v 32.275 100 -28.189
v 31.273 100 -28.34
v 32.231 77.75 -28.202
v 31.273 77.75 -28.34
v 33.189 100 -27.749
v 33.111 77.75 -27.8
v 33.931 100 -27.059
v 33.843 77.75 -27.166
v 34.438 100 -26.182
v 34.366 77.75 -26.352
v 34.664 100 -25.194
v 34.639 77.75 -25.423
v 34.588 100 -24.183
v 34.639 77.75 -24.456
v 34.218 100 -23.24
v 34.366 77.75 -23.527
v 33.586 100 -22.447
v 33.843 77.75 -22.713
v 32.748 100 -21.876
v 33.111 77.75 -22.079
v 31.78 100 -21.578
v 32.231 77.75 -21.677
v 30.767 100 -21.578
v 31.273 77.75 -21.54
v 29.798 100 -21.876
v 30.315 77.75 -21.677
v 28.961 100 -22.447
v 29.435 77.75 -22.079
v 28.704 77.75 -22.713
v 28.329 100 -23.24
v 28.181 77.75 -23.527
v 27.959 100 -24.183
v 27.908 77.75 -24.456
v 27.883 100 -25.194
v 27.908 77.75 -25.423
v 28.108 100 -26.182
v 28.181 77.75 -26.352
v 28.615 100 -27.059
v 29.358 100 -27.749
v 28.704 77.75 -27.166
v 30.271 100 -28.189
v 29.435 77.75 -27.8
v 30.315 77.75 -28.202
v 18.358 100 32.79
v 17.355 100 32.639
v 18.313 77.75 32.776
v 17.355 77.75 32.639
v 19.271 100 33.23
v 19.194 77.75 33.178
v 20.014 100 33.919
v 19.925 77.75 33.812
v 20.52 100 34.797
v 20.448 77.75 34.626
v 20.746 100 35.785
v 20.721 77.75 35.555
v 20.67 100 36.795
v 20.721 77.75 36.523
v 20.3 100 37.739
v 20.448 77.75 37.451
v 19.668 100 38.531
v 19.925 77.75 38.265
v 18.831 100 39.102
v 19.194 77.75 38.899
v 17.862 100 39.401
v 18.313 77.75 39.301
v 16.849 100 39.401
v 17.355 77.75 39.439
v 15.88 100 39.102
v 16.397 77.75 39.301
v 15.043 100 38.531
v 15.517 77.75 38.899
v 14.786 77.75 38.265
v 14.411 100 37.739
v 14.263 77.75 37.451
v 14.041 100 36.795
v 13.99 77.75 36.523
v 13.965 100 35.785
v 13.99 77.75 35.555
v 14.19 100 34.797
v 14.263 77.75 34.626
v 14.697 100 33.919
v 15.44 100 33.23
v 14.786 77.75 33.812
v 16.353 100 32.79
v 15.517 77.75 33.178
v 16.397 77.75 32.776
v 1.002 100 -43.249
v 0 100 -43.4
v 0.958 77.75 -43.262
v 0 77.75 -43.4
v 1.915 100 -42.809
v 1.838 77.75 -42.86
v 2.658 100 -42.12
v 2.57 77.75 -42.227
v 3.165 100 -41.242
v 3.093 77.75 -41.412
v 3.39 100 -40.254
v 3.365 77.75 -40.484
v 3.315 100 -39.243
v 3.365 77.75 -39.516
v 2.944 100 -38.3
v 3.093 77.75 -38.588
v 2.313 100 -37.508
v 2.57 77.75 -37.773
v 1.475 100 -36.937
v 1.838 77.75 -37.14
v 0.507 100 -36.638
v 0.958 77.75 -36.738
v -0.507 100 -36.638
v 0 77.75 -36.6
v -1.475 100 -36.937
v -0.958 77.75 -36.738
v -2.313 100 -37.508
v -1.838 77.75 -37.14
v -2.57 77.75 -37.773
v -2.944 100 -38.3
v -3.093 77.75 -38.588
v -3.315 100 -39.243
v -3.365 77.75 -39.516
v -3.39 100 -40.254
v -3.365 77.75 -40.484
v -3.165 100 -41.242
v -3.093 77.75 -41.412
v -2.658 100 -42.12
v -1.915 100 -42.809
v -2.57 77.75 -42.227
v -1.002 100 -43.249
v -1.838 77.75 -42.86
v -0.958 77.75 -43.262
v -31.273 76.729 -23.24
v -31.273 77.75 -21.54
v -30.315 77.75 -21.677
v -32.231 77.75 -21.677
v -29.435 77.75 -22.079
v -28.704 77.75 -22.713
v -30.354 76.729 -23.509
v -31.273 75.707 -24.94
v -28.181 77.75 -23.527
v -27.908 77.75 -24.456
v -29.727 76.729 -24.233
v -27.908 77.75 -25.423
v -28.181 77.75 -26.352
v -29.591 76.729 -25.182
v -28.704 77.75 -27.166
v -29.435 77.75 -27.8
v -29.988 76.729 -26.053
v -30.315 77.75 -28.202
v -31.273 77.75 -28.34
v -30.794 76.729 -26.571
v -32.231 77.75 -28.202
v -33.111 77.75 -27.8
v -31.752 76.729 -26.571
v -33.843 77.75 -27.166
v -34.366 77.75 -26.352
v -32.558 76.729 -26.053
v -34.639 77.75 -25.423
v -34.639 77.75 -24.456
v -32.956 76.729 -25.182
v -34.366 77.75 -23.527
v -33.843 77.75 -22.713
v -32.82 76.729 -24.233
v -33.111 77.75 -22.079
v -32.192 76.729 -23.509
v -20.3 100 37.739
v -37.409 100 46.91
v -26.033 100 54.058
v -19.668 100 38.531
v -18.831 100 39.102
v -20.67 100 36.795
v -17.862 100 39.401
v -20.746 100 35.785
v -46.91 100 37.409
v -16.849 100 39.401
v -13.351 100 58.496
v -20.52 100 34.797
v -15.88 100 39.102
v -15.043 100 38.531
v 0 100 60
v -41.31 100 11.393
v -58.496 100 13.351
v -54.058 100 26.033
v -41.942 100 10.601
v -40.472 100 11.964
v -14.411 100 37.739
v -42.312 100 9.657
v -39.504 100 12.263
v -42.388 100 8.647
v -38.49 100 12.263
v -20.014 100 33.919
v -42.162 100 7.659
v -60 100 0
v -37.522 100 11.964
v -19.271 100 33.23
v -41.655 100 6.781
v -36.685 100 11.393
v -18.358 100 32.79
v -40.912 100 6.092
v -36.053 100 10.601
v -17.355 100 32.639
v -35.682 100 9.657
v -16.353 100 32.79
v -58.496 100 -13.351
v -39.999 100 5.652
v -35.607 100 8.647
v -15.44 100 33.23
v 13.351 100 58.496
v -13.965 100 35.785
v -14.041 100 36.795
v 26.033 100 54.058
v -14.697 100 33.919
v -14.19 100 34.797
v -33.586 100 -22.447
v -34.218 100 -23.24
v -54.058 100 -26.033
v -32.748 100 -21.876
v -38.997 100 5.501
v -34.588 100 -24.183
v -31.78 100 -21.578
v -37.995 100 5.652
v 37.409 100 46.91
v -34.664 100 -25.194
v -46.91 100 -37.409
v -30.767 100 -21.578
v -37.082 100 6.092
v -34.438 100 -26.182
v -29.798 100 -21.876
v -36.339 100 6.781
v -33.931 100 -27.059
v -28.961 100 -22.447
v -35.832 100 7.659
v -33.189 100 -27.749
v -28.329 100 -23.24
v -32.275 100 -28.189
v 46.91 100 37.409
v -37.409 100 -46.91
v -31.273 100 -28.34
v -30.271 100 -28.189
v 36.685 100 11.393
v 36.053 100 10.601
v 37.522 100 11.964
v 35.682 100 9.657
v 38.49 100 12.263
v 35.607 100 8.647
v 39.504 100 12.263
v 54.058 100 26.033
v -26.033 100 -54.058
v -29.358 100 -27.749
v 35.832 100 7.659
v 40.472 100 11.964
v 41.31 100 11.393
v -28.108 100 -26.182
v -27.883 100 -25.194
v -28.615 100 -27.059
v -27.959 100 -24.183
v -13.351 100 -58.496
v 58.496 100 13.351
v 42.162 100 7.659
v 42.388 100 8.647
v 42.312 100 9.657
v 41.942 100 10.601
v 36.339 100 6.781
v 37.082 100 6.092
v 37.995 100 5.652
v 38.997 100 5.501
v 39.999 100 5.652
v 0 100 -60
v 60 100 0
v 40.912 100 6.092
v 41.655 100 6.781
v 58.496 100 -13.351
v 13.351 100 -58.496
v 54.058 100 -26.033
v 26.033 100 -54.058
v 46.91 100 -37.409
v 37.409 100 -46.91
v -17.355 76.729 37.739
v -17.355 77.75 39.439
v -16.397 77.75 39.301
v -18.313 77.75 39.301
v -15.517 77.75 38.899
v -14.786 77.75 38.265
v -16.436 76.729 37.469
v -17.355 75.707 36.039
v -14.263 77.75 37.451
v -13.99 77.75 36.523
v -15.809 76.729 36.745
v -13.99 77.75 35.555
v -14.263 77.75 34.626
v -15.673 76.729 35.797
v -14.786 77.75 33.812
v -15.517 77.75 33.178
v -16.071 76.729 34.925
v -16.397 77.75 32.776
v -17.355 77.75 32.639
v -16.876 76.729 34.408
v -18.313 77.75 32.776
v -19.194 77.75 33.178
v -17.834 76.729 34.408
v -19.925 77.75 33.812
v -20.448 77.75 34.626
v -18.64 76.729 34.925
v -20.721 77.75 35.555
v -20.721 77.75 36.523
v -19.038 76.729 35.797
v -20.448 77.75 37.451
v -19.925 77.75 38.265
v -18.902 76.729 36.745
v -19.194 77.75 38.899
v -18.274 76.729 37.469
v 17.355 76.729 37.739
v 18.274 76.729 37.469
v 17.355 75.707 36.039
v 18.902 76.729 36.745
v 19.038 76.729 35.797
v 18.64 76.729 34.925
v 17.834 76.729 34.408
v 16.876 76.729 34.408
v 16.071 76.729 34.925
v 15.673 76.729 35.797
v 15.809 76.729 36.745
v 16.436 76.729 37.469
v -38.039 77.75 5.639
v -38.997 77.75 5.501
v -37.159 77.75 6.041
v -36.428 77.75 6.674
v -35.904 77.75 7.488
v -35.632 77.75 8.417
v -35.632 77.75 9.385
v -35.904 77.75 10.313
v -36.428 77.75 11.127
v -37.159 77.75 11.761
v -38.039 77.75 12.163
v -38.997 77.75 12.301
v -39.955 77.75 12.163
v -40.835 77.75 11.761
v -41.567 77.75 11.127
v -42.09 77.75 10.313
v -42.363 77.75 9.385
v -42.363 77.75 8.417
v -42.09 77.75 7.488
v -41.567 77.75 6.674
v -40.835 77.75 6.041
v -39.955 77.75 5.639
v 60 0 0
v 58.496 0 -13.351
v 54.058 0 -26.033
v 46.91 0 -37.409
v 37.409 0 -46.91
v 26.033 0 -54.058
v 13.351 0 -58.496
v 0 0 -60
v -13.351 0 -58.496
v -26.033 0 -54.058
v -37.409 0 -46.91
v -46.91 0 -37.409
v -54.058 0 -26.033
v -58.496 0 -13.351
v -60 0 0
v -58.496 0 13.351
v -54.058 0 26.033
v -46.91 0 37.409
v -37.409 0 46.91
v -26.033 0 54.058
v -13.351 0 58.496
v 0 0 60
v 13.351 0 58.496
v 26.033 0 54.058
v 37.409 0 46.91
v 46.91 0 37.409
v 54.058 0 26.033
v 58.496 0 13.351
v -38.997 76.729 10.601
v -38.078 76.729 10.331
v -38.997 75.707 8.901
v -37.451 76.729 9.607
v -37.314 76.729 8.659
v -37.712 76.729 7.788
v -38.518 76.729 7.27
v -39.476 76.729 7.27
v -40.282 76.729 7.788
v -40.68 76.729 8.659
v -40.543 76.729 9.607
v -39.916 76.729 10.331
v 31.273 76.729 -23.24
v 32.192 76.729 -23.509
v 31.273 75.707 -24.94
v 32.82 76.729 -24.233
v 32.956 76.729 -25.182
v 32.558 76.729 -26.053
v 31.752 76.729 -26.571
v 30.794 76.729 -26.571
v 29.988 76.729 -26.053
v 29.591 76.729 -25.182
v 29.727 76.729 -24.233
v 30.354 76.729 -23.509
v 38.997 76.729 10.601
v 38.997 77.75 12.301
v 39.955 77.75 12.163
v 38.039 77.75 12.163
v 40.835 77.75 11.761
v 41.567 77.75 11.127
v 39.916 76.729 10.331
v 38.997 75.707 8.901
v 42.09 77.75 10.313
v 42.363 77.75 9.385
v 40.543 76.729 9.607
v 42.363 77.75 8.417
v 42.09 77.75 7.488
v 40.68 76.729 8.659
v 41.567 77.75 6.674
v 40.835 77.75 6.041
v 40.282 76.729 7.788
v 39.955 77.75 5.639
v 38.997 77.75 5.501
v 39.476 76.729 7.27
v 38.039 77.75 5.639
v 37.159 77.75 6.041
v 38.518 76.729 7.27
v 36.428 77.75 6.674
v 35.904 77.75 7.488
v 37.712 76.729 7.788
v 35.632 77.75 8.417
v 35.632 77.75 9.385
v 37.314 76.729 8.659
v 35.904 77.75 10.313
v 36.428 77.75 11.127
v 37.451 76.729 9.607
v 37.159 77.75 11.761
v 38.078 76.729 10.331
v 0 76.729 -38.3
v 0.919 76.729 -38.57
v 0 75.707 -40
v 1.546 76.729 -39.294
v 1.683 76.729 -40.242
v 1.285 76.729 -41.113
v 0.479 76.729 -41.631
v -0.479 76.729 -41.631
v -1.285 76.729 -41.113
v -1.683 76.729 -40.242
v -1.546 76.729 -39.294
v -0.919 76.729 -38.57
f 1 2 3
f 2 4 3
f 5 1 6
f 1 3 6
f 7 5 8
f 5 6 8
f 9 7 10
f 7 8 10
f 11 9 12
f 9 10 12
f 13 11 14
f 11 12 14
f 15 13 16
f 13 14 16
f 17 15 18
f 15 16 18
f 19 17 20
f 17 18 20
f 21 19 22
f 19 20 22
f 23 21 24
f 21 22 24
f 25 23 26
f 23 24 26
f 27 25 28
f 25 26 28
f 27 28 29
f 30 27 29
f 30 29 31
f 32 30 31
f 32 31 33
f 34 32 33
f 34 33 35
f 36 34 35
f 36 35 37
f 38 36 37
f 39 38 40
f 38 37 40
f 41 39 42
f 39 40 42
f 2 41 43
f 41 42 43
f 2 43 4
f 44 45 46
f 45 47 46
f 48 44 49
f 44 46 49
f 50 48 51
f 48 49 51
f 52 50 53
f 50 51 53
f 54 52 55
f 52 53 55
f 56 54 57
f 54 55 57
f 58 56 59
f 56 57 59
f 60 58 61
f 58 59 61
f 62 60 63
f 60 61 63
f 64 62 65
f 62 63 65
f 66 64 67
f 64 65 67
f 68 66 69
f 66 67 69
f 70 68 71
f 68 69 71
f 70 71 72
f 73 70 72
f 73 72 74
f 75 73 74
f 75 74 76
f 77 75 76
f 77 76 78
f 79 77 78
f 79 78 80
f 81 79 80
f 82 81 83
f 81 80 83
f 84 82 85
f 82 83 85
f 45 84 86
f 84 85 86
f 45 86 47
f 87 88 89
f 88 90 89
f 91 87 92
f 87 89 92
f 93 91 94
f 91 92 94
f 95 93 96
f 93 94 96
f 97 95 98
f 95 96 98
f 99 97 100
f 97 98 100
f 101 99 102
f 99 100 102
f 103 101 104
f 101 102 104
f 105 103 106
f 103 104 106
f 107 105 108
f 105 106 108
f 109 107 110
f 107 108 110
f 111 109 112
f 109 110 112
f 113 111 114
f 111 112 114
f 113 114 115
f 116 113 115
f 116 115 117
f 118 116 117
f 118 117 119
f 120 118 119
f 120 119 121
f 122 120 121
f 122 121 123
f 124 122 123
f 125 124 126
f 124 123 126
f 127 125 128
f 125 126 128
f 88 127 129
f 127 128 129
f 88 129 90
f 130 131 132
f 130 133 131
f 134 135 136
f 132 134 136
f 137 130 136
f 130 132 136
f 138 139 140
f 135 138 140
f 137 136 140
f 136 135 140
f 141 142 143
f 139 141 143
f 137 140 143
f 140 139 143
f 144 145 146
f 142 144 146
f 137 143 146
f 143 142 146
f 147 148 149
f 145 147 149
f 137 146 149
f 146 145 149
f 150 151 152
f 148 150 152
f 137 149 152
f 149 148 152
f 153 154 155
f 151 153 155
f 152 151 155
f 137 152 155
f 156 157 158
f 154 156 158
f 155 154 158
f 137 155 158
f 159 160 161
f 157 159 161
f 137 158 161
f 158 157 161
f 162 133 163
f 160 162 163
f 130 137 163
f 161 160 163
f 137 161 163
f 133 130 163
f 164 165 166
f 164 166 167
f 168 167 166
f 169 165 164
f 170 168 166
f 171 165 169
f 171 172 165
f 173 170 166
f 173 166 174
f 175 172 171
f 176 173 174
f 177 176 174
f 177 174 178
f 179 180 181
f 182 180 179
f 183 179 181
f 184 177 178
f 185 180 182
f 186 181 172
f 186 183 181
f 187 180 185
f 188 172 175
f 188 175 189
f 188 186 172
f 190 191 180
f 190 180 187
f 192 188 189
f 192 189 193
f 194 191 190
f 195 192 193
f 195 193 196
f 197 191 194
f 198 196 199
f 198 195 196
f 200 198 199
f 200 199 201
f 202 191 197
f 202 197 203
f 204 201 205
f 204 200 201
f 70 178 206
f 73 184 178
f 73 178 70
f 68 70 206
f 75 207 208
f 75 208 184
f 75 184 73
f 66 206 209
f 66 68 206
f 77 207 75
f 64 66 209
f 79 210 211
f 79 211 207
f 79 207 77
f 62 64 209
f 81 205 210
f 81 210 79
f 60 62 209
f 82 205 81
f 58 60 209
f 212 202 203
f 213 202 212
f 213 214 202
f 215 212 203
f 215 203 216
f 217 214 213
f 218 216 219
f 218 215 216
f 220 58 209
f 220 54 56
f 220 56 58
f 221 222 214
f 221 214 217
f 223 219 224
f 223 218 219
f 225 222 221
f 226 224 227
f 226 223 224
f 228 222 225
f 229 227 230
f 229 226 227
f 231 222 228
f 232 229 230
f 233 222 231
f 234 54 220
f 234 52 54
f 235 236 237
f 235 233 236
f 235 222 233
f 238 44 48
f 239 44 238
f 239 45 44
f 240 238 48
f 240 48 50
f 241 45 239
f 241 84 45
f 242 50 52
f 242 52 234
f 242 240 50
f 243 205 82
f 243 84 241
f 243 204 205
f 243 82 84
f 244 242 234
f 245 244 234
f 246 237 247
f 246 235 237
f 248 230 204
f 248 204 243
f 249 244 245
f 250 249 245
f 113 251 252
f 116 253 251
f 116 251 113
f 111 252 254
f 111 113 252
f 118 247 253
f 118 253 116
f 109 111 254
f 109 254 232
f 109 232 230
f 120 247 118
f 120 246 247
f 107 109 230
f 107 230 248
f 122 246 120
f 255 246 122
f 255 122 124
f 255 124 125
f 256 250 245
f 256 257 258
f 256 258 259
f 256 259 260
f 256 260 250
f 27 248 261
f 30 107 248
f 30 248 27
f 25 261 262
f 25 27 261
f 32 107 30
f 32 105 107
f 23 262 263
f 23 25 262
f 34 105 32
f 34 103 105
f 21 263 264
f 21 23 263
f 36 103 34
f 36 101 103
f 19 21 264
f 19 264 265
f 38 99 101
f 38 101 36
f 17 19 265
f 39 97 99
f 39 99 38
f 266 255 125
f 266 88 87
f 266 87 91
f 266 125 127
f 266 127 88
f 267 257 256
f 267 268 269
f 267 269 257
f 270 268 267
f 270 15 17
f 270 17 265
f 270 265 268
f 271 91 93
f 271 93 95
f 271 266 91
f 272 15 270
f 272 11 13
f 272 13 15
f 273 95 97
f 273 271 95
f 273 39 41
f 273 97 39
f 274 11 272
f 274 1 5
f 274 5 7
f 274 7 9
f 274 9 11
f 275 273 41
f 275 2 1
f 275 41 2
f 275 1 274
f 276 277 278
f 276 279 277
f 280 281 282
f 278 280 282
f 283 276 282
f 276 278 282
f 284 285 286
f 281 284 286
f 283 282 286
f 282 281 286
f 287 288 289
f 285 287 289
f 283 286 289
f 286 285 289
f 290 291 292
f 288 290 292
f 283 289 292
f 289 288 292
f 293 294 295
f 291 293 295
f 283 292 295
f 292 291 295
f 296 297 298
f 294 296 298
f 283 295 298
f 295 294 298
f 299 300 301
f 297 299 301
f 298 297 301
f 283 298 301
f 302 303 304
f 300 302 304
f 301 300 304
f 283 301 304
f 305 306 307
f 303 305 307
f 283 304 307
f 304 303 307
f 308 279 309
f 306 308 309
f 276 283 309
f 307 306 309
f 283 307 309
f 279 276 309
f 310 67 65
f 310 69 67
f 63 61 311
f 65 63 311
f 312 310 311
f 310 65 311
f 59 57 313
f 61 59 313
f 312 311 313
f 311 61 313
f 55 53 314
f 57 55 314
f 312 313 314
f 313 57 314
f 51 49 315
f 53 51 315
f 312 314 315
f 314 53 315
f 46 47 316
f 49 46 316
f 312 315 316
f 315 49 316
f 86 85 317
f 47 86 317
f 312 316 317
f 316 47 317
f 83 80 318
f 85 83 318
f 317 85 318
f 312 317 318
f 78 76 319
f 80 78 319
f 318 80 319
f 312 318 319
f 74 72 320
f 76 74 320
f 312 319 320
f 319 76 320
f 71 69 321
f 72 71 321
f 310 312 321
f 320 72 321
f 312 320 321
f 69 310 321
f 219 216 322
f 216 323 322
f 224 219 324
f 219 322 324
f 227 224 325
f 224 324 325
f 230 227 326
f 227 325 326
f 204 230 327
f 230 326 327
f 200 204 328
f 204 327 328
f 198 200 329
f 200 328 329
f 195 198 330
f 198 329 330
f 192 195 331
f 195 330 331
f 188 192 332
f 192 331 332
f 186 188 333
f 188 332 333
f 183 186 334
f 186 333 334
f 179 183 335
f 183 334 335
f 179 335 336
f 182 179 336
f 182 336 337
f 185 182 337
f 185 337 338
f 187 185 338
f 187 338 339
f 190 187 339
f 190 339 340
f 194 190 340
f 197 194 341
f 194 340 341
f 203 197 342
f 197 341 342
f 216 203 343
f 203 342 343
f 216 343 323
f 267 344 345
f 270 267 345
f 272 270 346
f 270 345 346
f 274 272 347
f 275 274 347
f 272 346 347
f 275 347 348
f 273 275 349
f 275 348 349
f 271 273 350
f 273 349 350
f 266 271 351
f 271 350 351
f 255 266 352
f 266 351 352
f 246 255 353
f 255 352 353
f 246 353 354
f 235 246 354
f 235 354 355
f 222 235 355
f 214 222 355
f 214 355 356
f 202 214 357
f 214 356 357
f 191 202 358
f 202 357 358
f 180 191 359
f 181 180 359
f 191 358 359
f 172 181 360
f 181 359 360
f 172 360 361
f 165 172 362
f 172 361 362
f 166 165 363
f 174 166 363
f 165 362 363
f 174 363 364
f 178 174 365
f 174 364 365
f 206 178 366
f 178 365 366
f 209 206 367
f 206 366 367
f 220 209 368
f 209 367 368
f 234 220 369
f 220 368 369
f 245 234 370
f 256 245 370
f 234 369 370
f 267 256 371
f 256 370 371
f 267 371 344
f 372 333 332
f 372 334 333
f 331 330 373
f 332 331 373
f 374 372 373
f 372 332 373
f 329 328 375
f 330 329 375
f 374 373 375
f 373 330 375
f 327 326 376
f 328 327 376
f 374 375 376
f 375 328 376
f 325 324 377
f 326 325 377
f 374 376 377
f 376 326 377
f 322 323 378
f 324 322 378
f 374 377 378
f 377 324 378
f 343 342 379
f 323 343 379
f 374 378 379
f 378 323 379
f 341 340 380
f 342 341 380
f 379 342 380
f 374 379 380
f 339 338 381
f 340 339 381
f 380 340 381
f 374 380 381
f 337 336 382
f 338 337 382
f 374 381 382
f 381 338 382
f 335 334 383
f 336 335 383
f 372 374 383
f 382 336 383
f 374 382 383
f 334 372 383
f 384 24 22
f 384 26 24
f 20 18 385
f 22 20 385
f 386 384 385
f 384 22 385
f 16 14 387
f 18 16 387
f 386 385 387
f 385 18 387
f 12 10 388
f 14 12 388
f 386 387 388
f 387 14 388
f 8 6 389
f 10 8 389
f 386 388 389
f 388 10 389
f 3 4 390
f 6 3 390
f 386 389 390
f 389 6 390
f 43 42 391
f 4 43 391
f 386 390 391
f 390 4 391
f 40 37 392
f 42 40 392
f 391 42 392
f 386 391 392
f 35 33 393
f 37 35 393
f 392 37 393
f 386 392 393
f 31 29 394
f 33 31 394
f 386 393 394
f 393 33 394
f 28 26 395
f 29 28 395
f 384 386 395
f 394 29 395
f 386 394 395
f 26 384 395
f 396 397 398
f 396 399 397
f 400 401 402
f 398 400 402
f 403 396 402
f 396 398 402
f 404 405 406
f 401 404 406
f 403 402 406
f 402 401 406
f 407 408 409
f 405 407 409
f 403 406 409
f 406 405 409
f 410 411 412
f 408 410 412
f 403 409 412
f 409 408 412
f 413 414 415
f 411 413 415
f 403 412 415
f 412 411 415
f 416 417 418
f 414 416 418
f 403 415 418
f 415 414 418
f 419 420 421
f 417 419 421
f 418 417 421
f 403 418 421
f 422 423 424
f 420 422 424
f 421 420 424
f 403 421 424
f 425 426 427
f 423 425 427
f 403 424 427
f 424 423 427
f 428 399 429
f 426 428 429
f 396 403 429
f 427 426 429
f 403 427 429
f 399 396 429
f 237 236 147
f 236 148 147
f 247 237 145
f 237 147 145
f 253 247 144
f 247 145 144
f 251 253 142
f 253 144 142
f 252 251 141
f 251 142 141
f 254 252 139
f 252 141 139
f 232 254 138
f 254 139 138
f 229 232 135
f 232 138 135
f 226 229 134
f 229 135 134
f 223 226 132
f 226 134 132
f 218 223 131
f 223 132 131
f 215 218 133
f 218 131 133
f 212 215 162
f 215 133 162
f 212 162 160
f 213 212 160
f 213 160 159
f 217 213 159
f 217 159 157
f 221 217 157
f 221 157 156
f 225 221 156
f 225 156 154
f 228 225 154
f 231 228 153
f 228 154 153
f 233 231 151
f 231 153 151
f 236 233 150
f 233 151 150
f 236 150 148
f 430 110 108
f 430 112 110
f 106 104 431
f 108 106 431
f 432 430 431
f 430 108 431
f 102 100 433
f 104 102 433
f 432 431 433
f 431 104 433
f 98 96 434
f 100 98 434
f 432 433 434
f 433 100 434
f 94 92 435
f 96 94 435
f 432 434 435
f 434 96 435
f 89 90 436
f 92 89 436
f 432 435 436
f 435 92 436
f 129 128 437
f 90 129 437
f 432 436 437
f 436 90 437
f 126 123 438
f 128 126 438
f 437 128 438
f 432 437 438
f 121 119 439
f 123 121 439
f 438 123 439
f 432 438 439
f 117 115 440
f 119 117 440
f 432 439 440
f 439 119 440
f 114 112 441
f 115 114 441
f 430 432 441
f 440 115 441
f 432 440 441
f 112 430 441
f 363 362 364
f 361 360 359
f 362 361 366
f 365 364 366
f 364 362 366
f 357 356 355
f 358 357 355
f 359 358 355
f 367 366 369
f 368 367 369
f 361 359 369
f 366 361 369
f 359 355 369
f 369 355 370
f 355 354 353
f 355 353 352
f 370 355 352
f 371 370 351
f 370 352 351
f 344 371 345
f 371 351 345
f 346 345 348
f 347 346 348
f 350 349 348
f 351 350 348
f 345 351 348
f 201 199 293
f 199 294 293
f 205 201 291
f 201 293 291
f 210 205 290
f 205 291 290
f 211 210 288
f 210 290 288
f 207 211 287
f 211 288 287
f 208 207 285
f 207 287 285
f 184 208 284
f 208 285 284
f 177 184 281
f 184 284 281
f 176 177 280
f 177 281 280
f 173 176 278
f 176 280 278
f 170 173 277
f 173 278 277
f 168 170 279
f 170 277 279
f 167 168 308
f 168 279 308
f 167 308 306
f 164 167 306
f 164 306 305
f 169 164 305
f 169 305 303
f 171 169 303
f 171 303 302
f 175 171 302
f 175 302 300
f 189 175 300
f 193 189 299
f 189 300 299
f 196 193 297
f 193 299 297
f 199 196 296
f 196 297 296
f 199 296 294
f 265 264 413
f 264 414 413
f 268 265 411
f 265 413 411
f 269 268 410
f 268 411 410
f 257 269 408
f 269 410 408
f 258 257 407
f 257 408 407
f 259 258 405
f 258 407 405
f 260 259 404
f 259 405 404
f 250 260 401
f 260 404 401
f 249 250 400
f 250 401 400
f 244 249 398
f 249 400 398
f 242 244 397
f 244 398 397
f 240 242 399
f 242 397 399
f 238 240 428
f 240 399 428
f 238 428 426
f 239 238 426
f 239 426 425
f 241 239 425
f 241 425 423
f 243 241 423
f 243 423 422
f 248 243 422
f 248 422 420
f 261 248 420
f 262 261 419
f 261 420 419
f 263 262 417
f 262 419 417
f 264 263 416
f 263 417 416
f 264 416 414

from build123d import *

# Parameters (mm, degrees)
SKETCH_1_R             = 60
EXTRUDE_1_DEPTH        = 100
HOLE_WIZARD_M8_1_D     = 6.8
HOLE_WIZARD_M8_1_DEPTH = 22.25
HOLE_WIZARD_M8_1_TIP   = 2.042926105


with BuildPart() as part:
    # 草圖1 → 填料-伸長1 (new body)
    with BuildSketch(Plane(origin=(0, 0, 0), x_dir=(1, 0, 0), z_dir=(0, 1, 0))):
        Circle(SKETCH_1_R)
    extrude(amount=EXTRUDE_1_DEPTH)

    # M8 螺紋孔1
    with Locations(Plane(origin=(0, 100, -40), x_dir=(0, 0, 1), z_dir=(0, 1, 0))):
        with Locations((0, 0), (15.060407926, 31.273259299), (48.900837358, 38.997116487), (76.038754716, 17.355349565), (76.038754716, -17.355349565), (48.900837358, -38.997116487), (15.060407926, -31.273259299)):
            Hole(HOLE_WIZARD_M8_1_D / 2, depth=HOLE_WIZARD_M8_1_DEPTH)
            with Locations((0, 0, -(HOLE_WIZARD_M8_1_DEPTH + HOLE_WIZARD_M8_1_TIP / 2))):  # 118° drill point
                Cone(0, HOLE_WIZARD_M8_1_D / 2, HOLE_WIZARD_M8_1_TIP, mode=Mode.SUBTRACT)


solid = part.part
